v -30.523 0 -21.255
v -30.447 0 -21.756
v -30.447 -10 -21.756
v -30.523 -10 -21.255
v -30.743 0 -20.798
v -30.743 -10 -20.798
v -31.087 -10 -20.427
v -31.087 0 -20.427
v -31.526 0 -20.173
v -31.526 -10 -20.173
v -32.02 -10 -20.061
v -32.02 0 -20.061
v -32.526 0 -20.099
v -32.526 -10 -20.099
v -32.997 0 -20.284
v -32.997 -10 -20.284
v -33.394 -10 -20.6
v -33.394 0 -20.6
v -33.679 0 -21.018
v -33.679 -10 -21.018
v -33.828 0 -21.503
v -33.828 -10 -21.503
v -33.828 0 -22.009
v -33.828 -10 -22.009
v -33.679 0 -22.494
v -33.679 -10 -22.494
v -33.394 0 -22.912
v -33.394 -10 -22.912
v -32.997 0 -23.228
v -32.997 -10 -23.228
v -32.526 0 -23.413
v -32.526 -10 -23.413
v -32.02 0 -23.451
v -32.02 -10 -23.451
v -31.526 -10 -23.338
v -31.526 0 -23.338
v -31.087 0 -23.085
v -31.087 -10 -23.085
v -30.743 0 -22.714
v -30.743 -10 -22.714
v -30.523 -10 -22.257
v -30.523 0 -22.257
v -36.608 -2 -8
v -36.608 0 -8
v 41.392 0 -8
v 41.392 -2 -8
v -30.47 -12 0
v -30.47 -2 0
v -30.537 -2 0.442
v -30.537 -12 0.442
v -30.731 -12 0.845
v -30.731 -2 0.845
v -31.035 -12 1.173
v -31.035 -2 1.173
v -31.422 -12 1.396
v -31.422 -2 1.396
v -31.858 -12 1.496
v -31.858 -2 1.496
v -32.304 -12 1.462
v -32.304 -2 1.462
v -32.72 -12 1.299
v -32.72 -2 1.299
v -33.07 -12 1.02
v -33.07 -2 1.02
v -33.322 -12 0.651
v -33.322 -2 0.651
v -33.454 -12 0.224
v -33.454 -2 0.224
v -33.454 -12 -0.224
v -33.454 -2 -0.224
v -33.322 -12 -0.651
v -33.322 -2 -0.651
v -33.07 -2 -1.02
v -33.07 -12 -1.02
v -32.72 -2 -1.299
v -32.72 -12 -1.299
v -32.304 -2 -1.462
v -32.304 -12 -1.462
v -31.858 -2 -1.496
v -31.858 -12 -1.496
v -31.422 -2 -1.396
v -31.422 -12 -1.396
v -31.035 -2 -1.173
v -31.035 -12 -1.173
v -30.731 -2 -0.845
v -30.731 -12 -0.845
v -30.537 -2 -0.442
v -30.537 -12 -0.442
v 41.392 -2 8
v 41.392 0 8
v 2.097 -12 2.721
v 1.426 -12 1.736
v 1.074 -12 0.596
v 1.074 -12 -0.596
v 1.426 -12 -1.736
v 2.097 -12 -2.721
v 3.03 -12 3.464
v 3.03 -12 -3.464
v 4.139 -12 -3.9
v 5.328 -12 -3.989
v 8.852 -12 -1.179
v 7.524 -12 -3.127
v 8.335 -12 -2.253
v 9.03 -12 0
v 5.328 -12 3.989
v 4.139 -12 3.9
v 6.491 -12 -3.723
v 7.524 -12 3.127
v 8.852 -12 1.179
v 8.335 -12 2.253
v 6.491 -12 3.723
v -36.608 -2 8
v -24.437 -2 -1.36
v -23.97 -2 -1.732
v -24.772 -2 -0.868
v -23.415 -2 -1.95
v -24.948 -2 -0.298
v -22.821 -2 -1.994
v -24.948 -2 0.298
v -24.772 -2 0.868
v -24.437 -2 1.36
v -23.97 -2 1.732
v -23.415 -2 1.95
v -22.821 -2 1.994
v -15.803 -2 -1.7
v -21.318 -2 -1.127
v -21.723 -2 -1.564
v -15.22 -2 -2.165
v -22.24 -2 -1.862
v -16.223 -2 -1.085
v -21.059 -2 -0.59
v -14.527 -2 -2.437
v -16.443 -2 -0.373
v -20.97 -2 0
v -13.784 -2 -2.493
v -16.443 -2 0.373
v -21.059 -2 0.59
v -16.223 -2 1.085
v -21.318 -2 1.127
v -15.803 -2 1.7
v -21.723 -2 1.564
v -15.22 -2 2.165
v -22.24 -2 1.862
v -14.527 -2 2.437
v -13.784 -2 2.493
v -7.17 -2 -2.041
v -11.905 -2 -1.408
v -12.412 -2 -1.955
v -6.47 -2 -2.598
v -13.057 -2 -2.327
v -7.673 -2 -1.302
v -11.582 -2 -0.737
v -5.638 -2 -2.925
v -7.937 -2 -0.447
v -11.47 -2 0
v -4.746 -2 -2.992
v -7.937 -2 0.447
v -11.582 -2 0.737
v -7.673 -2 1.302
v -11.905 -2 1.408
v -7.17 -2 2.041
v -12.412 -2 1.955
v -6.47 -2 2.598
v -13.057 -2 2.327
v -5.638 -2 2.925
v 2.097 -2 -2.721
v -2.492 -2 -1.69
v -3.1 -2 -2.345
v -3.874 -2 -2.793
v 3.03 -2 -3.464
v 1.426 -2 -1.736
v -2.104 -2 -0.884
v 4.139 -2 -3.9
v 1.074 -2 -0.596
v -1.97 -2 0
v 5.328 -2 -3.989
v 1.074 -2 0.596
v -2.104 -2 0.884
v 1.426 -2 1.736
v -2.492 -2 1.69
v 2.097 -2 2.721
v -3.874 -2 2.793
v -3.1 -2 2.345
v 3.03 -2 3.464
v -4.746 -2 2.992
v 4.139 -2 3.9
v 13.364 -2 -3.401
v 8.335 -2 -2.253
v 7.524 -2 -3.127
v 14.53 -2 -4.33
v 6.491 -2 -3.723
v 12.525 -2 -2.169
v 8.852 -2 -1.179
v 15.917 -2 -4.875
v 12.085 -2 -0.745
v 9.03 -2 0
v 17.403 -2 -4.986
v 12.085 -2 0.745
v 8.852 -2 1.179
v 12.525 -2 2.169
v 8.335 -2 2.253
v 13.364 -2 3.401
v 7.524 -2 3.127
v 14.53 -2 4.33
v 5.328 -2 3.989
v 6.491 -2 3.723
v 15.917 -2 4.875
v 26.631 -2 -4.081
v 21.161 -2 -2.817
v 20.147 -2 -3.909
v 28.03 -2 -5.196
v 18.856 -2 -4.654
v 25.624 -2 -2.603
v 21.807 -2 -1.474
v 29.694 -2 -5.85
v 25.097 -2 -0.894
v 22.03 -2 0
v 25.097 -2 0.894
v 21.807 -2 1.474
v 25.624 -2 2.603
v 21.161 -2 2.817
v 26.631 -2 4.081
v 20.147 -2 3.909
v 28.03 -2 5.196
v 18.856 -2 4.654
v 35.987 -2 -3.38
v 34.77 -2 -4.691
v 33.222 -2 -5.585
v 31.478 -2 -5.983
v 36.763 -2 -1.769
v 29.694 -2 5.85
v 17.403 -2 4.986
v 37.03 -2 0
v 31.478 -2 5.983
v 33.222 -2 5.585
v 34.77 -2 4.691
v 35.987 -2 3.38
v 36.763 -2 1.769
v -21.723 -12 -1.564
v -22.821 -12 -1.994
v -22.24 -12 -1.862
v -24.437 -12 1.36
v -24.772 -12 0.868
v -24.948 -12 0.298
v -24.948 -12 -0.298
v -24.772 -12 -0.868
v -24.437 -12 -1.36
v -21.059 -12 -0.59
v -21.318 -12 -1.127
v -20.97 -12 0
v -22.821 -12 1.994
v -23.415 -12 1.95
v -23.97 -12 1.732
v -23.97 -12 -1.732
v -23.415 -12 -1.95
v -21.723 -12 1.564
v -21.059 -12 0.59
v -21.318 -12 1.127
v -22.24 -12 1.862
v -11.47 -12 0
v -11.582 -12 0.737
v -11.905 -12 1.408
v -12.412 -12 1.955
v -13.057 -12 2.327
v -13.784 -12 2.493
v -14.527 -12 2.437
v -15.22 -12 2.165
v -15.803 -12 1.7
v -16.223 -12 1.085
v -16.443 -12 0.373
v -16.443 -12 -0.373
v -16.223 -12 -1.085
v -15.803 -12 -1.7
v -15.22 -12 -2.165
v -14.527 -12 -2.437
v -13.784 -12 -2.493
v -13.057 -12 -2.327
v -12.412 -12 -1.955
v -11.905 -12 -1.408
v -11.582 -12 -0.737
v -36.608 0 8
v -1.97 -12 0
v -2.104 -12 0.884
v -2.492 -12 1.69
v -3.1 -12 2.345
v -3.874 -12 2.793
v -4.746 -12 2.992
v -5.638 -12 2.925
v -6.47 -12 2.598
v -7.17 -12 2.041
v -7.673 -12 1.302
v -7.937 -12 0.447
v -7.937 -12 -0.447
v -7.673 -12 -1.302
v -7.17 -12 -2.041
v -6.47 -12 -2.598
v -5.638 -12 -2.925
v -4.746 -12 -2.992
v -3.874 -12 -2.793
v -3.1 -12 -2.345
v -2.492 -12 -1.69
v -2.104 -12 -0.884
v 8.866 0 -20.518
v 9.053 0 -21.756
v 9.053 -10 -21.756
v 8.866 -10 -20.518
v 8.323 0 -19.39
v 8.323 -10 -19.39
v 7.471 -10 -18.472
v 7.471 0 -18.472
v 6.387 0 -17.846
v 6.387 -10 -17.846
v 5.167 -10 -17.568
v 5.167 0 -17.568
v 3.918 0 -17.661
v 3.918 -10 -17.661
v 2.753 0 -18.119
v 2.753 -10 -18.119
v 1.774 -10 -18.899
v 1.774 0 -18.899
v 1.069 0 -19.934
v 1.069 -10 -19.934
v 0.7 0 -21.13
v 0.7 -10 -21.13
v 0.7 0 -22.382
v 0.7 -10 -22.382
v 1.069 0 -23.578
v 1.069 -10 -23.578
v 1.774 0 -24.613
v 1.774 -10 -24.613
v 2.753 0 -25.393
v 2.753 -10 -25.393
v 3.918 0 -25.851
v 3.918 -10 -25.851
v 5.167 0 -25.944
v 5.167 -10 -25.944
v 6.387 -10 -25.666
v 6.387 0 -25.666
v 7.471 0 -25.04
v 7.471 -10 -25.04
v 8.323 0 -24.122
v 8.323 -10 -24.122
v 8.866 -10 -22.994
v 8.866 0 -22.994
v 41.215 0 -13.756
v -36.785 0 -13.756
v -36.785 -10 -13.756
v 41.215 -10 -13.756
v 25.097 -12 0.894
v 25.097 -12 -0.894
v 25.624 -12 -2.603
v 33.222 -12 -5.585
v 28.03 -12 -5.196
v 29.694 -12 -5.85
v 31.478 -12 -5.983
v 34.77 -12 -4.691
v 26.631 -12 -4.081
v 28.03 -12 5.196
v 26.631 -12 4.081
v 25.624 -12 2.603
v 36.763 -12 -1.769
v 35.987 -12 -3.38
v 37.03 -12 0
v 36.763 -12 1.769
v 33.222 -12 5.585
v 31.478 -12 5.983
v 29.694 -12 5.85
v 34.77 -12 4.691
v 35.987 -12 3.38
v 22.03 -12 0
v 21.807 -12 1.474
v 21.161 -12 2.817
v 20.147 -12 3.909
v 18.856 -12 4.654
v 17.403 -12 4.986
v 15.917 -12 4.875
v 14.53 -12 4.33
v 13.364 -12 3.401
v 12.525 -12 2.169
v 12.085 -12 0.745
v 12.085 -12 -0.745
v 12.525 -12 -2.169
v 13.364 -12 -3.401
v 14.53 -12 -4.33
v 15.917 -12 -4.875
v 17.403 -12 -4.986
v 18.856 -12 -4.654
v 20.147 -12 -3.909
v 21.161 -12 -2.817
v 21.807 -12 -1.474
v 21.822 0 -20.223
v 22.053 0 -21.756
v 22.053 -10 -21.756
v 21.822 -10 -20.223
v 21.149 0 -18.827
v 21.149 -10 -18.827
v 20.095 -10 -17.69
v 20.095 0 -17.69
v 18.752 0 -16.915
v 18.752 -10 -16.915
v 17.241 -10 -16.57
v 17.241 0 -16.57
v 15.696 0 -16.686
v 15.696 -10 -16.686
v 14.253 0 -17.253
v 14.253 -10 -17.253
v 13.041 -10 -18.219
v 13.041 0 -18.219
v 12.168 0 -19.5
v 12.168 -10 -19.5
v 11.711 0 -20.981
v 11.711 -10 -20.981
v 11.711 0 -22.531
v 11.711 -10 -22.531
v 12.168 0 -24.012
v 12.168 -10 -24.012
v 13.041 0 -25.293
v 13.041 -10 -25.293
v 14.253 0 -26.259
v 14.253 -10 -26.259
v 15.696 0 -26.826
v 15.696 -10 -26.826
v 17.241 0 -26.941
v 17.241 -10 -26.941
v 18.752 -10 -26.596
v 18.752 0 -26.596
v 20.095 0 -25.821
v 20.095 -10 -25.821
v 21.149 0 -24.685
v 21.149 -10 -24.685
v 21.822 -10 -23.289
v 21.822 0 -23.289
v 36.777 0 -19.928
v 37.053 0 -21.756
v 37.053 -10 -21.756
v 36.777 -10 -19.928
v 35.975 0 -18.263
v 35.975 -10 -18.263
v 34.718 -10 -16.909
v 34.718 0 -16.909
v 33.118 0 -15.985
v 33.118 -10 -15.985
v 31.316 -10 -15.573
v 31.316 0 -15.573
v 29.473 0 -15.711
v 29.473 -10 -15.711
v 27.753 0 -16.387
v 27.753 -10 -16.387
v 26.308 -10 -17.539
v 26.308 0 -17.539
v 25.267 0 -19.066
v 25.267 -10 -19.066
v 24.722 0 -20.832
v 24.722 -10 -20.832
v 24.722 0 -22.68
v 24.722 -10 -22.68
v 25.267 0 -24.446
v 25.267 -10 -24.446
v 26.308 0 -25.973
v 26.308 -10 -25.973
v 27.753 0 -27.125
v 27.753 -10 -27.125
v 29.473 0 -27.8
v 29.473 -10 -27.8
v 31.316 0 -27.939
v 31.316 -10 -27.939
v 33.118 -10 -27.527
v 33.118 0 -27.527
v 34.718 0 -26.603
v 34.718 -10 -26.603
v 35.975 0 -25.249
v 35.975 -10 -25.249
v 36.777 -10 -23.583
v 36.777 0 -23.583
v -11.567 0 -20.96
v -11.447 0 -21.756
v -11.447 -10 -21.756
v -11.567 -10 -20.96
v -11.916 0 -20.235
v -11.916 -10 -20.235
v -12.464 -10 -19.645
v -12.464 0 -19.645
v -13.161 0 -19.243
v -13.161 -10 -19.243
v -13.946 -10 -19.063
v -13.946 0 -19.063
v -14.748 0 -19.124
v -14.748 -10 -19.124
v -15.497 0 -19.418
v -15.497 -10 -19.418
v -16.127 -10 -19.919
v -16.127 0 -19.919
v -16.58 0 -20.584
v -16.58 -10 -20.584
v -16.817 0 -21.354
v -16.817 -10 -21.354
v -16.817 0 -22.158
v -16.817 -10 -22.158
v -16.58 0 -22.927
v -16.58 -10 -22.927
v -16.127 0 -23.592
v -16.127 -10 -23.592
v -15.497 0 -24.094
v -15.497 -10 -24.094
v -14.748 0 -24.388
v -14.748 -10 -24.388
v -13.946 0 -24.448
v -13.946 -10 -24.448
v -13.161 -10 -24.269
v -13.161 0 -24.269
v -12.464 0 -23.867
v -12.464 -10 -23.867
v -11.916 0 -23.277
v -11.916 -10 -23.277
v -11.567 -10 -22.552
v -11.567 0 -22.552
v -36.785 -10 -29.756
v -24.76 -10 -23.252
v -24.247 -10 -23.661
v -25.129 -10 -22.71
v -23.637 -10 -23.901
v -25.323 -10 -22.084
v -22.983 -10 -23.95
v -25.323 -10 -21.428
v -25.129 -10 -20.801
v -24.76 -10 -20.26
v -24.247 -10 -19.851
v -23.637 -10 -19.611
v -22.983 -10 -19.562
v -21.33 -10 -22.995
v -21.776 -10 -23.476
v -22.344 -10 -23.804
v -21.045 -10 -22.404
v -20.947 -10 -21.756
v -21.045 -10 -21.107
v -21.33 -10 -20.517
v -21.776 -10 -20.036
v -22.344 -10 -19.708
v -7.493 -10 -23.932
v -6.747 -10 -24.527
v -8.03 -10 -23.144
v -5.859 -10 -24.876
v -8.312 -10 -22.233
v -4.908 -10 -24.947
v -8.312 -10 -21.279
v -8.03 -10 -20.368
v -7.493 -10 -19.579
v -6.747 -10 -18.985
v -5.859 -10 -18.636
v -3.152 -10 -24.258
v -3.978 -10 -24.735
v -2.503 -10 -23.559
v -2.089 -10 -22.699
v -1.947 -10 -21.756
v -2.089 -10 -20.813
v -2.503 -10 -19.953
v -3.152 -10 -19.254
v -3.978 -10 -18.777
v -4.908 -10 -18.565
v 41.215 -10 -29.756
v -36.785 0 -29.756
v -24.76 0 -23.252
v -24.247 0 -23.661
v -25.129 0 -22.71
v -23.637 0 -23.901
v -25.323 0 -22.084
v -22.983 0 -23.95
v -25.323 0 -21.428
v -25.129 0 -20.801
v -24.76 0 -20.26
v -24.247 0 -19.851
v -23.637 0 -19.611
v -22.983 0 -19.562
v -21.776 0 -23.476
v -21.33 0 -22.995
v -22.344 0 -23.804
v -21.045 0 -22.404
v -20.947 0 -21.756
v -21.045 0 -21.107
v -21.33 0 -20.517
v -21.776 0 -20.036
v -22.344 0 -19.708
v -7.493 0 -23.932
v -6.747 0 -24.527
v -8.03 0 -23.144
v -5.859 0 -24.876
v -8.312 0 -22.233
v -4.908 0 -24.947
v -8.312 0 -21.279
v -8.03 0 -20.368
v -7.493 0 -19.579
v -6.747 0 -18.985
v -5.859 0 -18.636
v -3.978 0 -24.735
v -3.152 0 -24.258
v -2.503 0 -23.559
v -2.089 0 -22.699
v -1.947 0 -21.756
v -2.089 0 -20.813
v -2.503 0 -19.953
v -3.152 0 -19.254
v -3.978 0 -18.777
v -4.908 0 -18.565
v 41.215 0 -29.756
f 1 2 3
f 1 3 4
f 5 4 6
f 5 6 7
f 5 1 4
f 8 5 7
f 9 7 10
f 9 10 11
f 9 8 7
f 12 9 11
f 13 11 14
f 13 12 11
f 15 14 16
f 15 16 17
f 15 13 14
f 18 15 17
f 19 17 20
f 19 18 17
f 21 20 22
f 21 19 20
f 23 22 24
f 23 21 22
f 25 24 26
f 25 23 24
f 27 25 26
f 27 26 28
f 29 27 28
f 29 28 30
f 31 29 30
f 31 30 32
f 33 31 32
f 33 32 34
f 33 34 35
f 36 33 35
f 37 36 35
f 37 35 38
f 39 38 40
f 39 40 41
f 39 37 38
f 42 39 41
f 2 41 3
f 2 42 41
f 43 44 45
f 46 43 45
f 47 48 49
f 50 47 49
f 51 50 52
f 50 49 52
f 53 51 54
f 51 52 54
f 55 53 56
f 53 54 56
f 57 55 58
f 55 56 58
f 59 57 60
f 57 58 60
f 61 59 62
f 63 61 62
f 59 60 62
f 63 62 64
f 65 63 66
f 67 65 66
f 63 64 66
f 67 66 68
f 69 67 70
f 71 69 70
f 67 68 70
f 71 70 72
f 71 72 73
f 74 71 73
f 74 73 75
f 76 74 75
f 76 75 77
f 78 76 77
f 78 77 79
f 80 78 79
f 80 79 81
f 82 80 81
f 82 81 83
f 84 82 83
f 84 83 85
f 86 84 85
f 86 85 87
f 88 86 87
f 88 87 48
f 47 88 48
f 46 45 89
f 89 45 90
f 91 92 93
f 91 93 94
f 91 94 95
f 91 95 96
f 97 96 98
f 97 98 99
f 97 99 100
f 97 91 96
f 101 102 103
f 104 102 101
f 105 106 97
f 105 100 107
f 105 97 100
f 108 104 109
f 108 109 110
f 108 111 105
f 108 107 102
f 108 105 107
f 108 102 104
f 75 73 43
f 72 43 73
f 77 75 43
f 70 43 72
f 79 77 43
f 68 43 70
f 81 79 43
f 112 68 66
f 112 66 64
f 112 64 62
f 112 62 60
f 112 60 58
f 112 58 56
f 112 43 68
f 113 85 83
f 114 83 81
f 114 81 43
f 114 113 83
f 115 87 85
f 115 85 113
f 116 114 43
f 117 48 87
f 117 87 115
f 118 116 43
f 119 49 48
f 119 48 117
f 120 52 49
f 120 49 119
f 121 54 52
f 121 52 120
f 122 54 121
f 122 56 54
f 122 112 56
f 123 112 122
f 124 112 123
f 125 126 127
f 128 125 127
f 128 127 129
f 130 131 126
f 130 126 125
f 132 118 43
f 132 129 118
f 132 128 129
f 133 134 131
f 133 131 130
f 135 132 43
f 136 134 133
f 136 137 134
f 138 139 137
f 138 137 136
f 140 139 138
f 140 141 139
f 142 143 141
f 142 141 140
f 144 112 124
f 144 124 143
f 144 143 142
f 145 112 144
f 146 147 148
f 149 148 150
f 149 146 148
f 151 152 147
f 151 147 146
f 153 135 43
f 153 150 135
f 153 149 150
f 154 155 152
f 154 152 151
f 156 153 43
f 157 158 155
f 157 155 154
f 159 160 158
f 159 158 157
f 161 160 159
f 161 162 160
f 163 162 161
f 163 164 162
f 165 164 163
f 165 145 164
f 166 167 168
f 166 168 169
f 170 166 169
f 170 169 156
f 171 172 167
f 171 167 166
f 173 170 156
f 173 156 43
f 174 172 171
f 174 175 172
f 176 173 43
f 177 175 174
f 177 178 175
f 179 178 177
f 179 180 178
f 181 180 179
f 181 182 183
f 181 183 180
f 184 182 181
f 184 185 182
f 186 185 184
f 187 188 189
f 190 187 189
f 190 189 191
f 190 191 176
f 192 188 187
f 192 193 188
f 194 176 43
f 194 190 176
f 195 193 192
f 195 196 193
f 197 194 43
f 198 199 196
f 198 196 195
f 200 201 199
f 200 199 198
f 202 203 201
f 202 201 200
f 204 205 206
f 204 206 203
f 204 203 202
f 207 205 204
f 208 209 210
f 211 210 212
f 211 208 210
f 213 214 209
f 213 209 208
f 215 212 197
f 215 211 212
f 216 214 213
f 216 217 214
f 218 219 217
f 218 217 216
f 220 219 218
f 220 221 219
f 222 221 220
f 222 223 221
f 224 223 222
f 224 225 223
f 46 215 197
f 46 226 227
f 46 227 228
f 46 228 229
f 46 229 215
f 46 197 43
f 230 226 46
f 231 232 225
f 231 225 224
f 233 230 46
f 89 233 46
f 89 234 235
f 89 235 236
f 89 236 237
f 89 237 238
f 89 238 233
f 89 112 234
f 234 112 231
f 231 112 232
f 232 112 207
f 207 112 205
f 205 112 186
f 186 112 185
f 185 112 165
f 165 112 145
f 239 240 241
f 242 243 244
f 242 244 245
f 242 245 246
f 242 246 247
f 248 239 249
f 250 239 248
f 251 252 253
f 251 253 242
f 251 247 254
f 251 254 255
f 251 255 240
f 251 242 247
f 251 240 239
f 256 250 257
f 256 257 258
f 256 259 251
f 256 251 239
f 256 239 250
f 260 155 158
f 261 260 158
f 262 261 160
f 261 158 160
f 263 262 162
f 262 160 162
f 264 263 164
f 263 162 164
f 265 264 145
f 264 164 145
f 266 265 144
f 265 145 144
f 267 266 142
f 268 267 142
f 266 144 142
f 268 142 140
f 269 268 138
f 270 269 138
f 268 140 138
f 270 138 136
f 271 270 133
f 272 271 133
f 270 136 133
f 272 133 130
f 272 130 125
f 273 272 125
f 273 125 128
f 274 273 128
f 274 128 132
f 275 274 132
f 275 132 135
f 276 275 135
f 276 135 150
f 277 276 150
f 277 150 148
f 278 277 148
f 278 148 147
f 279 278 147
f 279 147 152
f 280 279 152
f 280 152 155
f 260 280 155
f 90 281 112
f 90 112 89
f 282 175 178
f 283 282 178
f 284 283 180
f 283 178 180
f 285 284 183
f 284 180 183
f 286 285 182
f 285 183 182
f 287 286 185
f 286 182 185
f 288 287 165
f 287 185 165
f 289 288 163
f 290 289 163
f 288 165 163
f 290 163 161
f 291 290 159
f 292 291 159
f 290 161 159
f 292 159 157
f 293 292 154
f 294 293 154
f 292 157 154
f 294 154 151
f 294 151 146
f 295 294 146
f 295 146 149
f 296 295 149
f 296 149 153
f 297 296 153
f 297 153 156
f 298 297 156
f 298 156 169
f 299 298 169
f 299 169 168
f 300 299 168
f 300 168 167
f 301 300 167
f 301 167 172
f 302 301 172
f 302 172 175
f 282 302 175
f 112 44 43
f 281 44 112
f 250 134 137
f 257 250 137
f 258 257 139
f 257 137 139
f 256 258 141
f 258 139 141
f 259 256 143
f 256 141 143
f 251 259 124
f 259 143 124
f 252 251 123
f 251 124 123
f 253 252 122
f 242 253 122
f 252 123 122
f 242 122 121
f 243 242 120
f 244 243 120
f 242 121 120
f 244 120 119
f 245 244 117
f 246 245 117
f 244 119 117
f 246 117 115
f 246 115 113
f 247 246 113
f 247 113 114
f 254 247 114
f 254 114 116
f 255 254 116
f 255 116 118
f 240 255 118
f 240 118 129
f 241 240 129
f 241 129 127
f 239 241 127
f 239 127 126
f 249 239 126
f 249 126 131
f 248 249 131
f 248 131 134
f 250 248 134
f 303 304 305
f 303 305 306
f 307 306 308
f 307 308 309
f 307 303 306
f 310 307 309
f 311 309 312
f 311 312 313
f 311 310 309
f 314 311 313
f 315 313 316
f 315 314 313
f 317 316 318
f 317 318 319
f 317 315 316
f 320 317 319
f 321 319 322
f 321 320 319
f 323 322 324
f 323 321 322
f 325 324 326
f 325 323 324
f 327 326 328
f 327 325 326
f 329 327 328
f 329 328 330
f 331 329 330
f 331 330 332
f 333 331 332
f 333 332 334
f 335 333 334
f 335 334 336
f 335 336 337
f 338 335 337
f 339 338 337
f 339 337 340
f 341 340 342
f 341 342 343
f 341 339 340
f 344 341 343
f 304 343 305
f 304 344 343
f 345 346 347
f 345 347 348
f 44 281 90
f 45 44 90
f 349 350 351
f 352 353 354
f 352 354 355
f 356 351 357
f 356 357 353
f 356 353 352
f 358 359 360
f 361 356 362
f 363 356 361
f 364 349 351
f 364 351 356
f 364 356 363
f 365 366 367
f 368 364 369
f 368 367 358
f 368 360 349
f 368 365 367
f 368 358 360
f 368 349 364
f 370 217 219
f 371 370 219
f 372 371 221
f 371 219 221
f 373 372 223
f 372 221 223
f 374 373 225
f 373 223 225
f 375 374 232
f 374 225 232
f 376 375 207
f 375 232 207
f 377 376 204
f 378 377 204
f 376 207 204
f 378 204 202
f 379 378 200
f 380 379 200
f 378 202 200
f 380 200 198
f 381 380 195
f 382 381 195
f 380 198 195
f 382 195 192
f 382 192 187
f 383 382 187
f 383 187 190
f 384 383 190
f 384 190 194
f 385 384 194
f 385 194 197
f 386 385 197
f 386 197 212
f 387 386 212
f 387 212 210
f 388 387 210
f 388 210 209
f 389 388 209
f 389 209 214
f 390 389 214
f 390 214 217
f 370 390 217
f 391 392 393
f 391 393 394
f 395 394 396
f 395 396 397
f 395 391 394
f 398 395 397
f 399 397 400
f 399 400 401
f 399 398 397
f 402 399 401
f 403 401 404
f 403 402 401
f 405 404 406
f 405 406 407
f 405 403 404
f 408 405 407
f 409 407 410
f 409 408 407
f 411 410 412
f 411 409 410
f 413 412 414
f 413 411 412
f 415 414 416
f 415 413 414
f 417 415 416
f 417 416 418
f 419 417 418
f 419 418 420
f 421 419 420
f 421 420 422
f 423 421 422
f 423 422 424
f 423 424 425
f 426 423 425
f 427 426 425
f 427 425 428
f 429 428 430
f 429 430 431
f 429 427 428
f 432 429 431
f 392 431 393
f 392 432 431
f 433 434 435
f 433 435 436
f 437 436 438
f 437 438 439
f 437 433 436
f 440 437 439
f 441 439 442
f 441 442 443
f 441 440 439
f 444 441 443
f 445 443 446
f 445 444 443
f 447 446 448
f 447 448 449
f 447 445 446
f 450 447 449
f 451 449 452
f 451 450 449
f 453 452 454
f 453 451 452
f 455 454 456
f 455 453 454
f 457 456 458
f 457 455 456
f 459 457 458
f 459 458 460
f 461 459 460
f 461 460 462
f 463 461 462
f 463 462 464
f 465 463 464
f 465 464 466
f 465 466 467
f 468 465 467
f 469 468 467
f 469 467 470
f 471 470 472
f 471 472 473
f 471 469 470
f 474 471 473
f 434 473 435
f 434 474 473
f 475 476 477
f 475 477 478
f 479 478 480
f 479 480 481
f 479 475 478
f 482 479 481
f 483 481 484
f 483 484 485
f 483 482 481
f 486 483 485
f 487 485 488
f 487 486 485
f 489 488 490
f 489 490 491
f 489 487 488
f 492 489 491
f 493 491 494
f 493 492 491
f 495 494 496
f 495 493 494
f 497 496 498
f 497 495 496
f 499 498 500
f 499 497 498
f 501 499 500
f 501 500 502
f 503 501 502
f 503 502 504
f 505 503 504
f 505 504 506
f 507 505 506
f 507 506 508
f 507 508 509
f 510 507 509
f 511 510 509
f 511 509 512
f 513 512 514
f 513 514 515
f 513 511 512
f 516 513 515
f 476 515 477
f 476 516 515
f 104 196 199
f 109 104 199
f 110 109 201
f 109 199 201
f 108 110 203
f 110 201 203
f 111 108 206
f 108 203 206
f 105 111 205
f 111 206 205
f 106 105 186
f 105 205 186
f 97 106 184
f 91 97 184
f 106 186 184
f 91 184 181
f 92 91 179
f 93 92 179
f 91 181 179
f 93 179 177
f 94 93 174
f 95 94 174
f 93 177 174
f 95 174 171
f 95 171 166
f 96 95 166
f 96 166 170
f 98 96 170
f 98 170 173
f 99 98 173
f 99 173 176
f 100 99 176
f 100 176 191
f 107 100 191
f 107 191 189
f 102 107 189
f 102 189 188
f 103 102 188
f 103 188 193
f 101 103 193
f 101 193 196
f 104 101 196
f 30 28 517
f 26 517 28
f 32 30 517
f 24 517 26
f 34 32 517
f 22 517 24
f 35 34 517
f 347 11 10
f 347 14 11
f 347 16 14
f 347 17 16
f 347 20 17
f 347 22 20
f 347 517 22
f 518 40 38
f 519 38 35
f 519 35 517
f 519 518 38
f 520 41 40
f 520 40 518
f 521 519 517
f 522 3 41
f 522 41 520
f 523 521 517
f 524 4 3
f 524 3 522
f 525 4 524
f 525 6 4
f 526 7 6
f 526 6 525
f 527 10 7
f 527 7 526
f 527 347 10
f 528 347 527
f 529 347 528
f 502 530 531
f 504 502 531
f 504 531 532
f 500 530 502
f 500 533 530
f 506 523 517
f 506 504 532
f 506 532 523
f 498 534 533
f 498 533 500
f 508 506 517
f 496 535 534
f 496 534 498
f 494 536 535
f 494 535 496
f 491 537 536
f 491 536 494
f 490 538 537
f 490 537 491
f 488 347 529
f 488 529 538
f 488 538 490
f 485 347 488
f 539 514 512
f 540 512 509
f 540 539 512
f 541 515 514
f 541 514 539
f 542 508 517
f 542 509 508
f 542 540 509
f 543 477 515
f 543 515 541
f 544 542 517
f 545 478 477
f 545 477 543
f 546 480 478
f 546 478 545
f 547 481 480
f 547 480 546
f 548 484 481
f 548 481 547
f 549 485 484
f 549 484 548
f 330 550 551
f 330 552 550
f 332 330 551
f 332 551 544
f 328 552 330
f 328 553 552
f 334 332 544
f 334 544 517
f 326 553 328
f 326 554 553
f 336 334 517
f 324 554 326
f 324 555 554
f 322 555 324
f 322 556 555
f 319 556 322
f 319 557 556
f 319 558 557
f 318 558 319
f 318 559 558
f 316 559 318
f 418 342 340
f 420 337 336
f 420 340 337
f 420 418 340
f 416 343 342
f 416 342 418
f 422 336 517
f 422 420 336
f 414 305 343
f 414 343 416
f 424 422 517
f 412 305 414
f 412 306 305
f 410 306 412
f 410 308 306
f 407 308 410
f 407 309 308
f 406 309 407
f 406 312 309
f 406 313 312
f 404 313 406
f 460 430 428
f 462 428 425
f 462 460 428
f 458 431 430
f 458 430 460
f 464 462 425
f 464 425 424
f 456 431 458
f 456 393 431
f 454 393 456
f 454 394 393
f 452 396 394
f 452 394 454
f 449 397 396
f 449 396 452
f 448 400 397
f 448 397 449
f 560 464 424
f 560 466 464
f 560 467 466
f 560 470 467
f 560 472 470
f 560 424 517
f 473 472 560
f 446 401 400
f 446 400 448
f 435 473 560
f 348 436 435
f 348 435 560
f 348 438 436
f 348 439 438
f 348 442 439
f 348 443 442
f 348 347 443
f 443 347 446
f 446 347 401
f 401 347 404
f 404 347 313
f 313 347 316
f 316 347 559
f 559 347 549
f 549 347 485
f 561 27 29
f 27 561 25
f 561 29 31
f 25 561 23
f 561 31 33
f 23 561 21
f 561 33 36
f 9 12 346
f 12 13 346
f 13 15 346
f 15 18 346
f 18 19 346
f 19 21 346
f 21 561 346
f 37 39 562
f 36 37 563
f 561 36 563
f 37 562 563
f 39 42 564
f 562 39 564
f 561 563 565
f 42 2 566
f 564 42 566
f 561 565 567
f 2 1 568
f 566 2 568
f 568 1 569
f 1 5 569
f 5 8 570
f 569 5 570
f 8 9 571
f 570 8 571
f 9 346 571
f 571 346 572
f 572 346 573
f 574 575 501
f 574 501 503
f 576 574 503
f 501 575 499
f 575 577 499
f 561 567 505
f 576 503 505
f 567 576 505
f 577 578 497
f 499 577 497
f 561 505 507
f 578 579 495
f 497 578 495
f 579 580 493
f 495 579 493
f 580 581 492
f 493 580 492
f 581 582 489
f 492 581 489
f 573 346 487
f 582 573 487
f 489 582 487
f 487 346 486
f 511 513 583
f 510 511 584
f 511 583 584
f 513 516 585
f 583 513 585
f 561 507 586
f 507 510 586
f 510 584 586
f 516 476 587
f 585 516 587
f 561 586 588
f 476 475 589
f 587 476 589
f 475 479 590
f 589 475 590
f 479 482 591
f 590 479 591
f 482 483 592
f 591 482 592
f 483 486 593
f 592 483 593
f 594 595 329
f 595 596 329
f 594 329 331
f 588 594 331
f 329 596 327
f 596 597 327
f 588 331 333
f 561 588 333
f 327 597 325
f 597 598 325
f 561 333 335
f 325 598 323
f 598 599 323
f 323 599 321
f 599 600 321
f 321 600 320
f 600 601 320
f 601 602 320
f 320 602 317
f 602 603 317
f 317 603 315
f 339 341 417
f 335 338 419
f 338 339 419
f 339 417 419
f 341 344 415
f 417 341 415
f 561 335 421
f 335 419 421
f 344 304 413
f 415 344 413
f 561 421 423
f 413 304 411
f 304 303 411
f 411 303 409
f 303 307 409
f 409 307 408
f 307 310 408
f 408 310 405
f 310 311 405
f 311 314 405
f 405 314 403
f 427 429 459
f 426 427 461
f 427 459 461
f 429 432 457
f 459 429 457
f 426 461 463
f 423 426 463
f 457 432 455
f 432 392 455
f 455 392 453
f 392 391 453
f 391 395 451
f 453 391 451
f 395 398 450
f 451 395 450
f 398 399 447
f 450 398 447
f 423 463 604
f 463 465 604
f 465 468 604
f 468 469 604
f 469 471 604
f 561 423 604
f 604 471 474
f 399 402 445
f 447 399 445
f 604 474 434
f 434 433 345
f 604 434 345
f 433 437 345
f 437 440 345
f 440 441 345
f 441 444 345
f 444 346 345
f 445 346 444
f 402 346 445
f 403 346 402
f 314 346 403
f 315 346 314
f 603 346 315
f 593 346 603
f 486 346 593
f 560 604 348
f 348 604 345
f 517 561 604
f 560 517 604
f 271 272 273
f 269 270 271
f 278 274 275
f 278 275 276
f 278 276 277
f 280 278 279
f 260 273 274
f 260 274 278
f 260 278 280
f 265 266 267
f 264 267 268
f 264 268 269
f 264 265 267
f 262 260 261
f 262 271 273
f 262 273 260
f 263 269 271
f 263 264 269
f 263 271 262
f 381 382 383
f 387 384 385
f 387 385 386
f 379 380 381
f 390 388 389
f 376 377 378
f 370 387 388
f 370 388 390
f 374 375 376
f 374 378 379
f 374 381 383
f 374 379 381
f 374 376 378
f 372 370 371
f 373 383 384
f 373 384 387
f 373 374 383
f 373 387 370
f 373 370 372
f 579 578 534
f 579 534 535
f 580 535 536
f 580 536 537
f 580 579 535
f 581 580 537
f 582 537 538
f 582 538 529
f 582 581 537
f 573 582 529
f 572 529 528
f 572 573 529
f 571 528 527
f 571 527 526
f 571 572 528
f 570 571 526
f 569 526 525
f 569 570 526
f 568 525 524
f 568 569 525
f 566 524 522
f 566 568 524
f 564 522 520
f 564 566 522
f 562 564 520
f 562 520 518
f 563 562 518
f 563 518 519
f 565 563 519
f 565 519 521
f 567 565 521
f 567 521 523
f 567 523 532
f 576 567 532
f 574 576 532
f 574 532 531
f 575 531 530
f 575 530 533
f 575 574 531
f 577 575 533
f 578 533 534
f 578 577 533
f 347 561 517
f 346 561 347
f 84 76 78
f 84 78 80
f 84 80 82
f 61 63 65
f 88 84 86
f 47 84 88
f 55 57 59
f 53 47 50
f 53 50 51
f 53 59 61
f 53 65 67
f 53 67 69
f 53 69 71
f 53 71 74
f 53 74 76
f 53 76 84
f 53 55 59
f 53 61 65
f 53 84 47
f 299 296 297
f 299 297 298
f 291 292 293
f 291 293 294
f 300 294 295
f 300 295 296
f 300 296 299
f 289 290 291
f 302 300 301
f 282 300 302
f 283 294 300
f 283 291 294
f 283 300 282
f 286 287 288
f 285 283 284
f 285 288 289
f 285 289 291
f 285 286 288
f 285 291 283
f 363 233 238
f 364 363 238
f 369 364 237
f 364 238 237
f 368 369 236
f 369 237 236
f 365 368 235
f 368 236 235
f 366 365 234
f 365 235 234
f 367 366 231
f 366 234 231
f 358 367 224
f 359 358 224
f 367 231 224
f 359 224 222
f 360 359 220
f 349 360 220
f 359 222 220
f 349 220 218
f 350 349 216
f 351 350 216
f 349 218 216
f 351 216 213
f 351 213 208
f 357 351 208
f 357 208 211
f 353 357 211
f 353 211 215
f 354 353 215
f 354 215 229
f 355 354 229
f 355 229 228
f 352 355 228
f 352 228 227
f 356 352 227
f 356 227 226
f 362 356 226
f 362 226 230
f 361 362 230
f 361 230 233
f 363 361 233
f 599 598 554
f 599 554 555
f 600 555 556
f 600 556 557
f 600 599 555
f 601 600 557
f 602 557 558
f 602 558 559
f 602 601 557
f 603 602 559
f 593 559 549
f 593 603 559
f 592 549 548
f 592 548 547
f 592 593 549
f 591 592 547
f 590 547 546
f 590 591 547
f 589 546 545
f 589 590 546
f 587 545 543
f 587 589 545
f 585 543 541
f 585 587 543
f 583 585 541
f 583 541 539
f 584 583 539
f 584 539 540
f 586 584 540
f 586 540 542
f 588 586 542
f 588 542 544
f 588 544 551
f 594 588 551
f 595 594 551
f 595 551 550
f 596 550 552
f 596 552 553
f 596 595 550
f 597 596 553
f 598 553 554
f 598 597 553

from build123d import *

# Parameters (mm, degrees)
F0_W     = 78
F0_H     = 16
F0_R     = 1.5
F0_R_2   = 2
F0_R_3   = 2.5
F0_R_4   = 3
F0_R_5   = 4
F0_R_6   = 5
F0_R_7   = 6
F2_DEPTH = 2
F3_DEPTH = 12
F1_W     = 78
F1_H     = 16
F1_R     = 3.2
F1_R_2   = 5.2
F1_R_3   = 1.7
F1_R_4   = 2.2
F1_R_5   = 2.7
F1_R_6   = 4.2
F1_R_7   = 6.2
F4_DEPTH = 10


with BuildPart() as f2:
    # F0 (on Front) → F2 (new body)
    with BuildSketch(Plane.XZ):
        with Locations((2.3918330073, 0)):
            Rectangle(F0_W, F0_H)
        with Locations((-31.9704519261, 0)):
            Circle(F0_R, mode=Mode.SUBTRACT)
        with Locations((-22.9704519261, 0)):
            Circle(F0_R_2, mode=Mode.SUBTRACT)
        with Locations((-13.9704519261, 0)):
            Circle(F0_R_3, mode=Mode.SUBTRACT)
        with Locations((-4.9704519261, 0)):
            Circle(F0_R_4, mode=Mode.SUBTRACT)
        with Locations((5.0295480739, 0)):
            Circle(F0_R_5, mode=Mode.SUBTRACT)
        with Locations((17.0295480739, 0)):
            Circle(F0_R_6, mode=Mode.SUBTRACT)
        with Locations((31.0295480739, 0)):
            Circle(F0_R_7, mode=Mode.SUBTRACT)
        with Locations((31.0295480739, 0)):
            Circle(F0_R_7)
        with Locations((17.0295480739, 0)):
            Circle(F0_R_6)
        with Locations((5.0295480739, 0)):
            Circle(F0_R_5)
        with Locations((-4.9704519261, 0)):
            Circle(F0_R_4)
        with Locations((-13.9704519261, 0)):
            Circle(F0_R_3)
        with Locations((-22.9704519261, 0)):
            Circle(F0_R_2)
        with Locations((-31.9704519261, 0)):
            Circle(F0_R)
    extrude(amount=F2_DEPTH)

    # F0 (on Front) → F3 (join)
    with BuildSketch(Plane.XZ):
        with Locations((-31.9704519261, 0)):
            Circle(F0_R)
        with Locations((-22.9704519261, 0)):
            Circle(F0_R_2)
        with Locations((-13.9704519261, 0)):
            Circle(F0_R_3)
        with Locations((-4.9704519261, 0)):
            Circle(F0_R_4)
        with Locations((5.0295480739, 0)):
            Circle(F0_R_5)
        with Locations((17.0295480739, 0)):
            Circle(F0_R_6)
        with Locations((31.0295480739, 0)):
            Circle(F0_R_7)
    extrude(amount=F3_DEPTH)


with BuildPart() as f4:
    # F1 (on Front) → F4 (new body)
    with BuildSketch(Plane.XZ):
        with Locations((2.2149536405, -21.7559370212)):
            Rectangle(F1_W, F1_H)
        with Locations((-5.147331293, -21.7559370212)):
            Circle(F1_R, mode=Mode.SUBTRACT)
        with Locations((16.852668707, -21.7559370212)):
            Circle(F1_R_2, mode=Mode.SUBTRACT)
        with Locations((-32.147331293, -21.7559370212)):
            Circle(F1_R_3, mode=Mode.SUBTRACT)
        with Locations((-23.147331293, -21.7559370212)):
            Circle(F1_R_4, mode=Mode.SUBTRACT)
        with Locations((-14.147331293, -21.7559370212)):
            Circle(F1_R_5, mode=Mode.SUBTRACT)
        with Locations((4.852668707, -21.7559370212)):
            Circle(F1_R_6, mode=Mode.SUBTRACT)
        with Locations((30.852668707, -21.7559370212)):
            Circle(F1_R_7, mode=Mode.SUBTRACT)
    extrude(amount=F4_DEPTH)


solid = Compound([f2.part, f4.part])
